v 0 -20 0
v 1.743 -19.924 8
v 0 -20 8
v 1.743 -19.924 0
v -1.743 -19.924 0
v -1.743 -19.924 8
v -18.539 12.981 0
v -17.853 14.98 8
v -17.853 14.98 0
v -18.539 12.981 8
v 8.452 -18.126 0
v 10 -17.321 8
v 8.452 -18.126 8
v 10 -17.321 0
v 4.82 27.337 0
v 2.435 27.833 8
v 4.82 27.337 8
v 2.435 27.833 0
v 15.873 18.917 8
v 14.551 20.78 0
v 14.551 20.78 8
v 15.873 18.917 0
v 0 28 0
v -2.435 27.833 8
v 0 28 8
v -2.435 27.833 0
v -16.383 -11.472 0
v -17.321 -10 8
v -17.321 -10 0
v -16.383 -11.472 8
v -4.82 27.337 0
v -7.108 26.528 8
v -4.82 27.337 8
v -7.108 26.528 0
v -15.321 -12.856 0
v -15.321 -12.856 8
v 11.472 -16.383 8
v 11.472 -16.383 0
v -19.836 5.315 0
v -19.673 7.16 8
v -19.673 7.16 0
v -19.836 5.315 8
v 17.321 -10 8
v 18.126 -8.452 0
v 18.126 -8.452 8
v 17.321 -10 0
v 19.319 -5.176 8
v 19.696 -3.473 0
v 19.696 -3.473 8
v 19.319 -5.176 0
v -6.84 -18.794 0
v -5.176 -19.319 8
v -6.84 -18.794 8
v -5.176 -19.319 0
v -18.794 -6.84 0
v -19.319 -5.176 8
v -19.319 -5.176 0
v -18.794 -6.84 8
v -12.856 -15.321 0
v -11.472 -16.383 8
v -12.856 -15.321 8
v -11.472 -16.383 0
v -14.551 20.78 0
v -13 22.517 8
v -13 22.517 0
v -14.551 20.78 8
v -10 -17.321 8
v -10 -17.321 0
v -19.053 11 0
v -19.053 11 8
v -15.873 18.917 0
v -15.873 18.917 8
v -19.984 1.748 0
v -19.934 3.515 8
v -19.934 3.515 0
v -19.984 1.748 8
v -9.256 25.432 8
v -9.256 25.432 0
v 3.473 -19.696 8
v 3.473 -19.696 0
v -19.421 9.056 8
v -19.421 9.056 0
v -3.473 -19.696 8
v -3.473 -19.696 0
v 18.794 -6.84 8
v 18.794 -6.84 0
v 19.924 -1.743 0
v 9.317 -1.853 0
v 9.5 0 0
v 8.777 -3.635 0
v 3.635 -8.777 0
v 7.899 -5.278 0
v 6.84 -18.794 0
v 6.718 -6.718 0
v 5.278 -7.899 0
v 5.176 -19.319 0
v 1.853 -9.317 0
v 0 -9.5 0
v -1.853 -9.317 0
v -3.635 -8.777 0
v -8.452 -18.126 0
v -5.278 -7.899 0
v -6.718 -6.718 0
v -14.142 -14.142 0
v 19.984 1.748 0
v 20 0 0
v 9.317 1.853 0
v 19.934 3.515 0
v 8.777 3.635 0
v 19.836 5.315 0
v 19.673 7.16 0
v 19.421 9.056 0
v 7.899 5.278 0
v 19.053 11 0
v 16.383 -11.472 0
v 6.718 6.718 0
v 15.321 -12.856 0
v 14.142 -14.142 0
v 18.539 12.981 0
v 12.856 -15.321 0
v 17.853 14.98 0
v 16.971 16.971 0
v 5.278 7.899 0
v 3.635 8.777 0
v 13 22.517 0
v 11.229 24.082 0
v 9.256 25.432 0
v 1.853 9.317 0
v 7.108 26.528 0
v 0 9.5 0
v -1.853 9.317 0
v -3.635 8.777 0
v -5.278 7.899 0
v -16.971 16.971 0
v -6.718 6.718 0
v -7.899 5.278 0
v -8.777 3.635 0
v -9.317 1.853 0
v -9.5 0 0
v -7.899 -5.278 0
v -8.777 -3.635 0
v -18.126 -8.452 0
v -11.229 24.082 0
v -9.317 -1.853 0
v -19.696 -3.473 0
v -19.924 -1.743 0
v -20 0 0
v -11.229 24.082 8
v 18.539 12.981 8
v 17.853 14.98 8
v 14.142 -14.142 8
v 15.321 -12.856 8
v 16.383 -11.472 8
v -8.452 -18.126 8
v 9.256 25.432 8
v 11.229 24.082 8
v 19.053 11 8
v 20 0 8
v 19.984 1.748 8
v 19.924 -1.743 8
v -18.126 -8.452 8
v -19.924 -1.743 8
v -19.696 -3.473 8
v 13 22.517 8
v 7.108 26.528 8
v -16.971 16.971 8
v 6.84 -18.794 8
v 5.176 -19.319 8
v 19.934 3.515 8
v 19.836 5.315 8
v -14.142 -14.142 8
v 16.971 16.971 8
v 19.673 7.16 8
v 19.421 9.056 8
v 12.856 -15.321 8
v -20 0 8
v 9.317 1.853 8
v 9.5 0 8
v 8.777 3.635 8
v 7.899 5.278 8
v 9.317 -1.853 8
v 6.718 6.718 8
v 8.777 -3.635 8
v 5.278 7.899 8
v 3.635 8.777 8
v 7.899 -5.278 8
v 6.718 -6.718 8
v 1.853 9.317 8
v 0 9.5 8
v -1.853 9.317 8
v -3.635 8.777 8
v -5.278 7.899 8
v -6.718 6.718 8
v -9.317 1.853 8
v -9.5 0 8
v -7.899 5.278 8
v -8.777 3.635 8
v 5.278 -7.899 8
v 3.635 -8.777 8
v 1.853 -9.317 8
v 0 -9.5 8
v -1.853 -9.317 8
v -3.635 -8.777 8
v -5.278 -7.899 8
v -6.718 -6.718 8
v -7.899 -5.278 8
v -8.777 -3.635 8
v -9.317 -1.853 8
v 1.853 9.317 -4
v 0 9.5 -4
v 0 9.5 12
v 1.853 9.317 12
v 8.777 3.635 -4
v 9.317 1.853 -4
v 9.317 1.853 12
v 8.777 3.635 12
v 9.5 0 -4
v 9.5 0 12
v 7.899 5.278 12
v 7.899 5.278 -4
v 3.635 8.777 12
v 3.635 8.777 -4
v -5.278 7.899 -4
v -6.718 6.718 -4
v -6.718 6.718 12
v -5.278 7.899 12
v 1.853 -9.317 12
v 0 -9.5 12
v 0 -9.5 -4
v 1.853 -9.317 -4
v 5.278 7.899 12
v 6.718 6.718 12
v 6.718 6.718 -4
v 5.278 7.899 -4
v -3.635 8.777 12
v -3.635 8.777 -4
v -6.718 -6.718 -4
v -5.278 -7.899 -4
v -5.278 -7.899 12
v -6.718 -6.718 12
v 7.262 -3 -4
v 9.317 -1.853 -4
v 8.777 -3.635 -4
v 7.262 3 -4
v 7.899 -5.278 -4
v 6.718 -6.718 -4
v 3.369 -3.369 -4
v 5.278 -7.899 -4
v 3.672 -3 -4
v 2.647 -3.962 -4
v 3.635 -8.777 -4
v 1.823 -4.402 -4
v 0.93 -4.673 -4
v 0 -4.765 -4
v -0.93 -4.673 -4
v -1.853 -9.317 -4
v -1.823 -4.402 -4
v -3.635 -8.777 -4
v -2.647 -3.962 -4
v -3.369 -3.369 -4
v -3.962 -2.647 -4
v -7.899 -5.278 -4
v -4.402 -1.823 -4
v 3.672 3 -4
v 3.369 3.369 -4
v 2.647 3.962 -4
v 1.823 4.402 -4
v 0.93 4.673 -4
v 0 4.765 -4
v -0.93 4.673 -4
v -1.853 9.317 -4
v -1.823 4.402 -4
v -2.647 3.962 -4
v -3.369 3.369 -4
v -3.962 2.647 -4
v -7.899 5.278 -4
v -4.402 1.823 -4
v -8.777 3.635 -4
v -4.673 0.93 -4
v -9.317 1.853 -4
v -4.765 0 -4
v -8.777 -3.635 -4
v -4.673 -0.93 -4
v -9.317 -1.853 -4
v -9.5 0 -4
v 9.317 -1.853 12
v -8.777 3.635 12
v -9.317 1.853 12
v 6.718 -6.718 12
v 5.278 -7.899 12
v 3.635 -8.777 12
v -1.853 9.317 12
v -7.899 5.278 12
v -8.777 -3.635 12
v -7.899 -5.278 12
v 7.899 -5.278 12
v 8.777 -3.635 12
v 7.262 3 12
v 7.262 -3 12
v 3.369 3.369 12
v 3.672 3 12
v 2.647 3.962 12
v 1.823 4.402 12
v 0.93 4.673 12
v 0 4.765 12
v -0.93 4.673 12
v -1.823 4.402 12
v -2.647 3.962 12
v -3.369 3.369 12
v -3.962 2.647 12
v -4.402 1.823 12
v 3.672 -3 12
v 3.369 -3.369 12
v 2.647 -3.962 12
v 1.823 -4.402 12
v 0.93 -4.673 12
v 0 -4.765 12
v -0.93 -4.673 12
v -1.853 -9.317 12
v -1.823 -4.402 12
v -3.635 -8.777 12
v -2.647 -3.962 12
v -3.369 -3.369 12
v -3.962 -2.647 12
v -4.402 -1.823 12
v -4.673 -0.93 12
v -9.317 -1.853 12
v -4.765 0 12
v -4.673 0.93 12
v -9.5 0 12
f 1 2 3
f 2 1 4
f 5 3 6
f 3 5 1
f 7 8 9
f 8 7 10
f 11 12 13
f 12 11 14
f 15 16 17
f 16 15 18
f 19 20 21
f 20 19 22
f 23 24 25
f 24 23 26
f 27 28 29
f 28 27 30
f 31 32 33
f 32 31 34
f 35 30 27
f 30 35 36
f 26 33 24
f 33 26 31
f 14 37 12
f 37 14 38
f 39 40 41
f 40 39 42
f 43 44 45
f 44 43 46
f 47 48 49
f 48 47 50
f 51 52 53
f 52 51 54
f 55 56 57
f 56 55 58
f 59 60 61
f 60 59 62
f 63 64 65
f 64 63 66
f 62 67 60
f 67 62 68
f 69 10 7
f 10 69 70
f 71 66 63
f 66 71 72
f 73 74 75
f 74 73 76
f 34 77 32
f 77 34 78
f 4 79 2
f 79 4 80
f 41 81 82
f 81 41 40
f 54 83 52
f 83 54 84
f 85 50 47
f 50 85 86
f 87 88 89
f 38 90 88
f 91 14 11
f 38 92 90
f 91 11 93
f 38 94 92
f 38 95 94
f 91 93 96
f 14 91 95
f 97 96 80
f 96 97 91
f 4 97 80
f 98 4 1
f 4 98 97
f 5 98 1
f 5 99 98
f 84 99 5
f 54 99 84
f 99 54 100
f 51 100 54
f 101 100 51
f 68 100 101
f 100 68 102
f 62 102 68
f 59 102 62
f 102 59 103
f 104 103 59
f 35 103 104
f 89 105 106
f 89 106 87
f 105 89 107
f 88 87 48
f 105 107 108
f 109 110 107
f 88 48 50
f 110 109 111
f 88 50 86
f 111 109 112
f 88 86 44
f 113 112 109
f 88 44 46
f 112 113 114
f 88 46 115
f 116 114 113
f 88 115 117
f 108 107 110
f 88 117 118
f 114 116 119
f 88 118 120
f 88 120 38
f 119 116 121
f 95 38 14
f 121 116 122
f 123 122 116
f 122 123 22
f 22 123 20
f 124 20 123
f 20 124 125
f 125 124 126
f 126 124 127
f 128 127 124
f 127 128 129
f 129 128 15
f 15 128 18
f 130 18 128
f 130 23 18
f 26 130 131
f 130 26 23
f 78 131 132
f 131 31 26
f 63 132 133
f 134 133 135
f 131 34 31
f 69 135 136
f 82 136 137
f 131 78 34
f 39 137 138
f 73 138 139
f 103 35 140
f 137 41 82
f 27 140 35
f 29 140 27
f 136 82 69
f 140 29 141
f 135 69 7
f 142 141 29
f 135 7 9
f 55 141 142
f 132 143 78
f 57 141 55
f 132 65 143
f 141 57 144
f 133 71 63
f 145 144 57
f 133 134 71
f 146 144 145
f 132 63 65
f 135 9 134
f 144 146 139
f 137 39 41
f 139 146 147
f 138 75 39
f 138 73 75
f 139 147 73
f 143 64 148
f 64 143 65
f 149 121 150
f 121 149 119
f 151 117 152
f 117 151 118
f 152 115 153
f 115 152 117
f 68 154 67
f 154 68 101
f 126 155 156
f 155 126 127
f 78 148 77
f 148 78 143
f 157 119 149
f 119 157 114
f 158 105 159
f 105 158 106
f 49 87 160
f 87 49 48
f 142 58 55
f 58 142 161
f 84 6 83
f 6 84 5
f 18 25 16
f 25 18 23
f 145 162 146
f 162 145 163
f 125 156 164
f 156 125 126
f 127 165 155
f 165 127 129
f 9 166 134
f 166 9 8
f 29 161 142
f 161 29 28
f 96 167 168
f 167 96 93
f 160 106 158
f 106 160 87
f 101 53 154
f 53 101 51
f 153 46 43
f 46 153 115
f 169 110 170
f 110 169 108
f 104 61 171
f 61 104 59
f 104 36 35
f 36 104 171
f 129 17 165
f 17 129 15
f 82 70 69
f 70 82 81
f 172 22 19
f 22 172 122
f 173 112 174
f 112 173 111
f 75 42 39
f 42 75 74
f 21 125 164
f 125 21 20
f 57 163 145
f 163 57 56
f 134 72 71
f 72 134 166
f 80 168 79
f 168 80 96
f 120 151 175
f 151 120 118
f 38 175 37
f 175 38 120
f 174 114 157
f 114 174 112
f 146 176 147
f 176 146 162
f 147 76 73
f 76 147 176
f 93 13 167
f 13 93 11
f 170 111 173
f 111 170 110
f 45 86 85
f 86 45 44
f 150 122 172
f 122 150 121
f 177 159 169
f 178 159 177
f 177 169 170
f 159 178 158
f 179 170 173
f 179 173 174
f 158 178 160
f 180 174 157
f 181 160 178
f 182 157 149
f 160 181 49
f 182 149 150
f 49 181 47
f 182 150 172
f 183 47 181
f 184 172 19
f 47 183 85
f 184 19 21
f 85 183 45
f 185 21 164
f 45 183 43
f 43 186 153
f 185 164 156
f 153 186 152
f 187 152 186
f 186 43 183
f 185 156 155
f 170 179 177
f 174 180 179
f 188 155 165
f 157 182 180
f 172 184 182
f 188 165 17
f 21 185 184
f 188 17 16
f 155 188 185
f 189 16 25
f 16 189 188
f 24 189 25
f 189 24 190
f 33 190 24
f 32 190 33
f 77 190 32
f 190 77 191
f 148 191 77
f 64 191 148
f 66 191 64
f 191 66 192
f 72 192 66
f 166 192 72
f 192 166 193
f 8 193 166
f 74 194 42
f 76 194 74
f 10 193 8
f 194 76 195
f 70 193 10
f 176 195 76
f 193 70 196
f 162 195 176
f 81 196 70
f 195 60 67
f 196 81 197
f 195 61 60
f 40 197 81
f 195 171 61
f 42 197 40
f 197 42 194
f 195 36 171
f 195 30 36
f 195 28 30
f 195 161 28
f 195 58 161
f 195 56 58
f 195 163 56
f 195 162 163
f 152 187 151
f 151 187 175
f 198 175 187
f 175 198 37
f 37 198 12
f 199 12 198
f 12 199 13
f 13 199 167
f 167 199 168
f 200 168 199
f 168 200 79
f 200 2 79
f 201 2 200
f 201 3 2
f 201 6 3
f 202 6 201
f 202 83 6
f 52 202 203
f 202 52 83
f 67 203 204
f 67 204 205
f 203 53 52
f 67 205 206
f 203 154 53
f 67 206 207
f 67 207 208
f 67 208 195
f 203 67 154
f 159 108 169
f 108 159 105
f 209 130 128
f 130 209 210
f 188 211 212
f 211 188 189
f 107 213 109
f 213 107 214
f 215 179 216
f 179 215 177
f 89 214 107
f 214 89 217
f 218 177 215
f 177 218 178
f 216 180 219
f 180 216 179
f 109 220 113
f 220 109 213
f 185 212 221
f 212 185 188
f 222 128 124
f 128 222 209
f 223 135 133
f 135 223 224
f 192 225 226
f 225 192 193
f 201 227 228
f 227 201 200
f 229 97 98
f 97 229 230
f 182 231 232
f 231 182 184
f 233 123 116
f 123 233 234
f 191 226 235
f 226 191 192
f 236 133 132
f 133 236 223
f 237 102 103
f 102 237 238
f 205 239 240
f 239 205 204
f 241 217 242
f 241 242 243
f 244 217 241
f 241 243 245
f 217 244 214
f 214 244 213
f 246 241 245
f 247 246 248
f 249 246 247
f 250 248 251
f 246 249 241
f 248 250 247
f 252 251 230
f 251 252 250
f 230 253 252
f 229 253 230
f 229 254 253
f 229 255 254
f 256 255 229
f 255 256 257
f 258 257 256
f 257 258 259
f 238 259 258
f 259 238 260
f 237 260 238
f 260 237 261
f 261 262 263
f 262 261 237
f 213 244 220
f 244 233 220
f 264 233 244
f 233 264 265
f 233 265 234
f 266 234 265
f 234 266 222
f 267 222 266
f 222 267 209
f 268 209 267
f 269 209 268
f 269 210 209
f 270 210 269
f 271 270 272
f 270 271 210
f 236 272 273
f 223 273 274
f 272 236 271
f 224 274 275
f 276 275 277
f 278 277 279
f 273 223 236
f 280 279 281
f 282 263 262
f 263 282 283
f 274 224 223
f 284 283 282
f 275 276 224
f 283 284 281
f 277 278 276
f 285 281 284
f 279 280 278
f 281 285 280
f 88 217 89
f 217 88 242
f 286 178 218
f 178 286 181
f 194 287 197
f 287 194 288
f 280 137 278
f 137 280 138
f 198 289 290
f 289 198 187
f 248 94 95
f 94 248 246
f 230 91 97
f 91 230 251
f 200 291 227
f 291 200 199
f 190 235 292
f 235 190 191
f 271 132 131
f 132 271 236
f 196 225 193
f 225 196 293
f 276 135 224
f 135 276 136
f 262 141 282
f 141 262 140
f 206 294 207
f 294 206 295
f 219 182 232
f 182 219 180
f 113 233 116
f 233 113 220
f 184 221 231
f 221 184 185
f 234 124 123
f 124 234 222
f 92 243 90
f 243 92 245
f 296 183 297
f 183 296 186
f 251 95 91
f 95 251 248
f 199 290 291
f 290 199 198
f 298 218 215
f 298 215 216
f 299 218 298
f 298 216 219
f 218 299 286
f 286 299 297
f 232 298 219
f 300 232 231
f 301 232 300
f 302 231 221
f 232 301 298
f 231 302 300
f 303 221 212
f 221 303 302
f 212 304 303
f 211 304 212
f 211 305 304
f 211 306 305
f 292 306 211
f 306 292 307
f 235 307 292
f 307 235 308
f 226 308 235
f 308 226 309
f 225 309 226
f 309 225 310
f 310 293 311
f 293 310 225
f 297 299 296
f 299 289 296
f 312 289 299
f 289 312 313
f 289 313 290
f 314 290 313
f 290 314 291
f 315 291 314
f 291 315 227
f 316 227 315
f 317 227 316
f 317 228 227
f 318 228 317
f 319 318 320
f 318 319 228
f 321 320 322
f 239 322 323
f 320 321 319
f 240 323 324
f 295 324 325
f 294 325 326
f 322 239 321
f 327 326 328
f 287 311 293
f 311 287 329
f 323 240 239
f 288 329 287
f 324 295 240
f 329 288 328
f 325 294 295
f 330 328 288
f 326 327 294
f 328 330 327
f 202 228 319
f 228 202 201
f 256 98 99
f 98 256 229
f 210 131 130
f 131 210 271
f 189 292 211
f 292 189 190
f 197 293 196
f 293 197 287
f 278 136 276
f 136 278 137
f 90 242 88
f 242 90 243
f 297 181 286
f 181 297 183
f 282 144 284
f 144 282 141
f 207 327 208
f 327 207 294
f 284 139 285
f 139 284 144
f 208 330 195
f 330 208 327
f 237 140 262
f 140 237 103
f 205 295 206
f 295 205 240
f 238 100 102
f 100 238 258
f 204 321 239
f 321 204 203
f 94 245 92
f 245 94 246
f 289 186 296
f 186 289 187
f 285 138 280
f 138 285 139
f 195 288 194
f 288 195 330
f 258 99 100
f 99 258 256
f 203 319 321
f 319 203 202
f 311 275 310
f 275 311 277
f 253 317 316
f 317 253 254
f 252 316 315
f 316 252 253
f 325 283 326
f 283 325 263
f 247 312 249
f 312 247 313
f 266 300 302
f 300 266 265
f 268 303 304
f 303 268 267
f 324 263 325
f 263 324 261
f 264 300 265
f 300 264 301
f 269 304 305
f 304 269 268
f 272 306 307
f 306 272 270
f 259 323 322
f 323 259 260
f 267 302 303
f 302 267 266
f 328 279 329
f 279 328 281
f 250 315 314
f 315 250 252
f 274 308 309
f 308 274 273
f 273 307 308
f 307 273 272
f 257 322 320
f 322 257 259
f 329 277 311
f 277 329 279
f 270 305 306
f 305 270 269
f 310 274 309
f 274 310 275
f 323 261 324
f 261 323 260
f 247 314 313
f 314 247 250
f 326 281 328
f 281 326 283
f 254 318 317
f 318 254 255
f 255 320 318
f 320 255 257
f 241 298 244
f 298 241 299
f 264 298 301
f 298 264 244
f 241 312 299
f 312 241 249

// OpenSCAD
$fn = 32;

// ----------------------------------------------------------------------
// Cam: base radius 20 mm with a 8 mm lift over 180 degrees
// ----------------------------------------------------------------------

// --- parameters (mm) ---
base_r = 20;              // base radius
lift = 8;                 // lift height above the base radius
lift_span = 180;          // angular width of the lift
lift_start = 0;           // angle where the lift starts
cam_t = 8;                // cam plate thickness
hub_d = 19;               // hub diameter
hub_h = 16;               // hub height
bore_d = 9.53;            // bore
key_w = 6;                // keyway width
key_depth = 2.74;         // keyway depth

cam_profile = [[20, 0], [19.984, 1.748], [19.934, 3.515], [19.836, 5.315], [19.673, 7.16], [19.421, 9.056], [19.053, 11], [18.539, 12.981], [17.853, 14.98], [16.971, 16.971], [15.873, 18.917], [14.551, 20.78], [13, 22.517], [11.229, 24.082], [9.256, 25.432], [7.108, 26.528], [4.82, 27.337], [2.435, 27.833], [0, 28], [-2.435, 27.833], [-4.82, 27.337], [-7.108, 26.528], [-9.256, 25.432], [-11.229, 24.082], [-13, 22.517], [-14.551, 20.78], [-15.873, 18.917], [-16.971, 16.971], [-17.853, 14.98], [-18.539, 12.981], [-19.053, 11], [-19.421, 9.056], [-19.673, 7.16], [-19.836, 5.315], [-19.934, 3.515], [-19.984, 1.748], [-20, 0], [-19.924, -1.743], [-19.696, -3.473], [-19.319, -5.176], [-18.794, -6.84], [-18.126, -8.452], [-17.321, -10], [-16.383, -11.472], [-15.321, -12.856], [-14.142, -14.142], [-12.856, -15.321], [-11.472, -16.383], [-10, -17.321], [-8.452, -18.126], [-6.84, -18.794], [-5.176, -19.319], [-3.473, -19.696], [-1.743, -19.924], [0, -20], [1.743, -19.924], [3.473, -19.696], [5.176, -19.319], [6.84, -18.794], [8.452, -18.126], [10, -17.321], [11.472, -16.383], [12.856, -15.321], [14.142, -14.142], [15.321, -12.856], [16.383, -11.472], [17.321, -10], [18.126, -8.452], [18.794, -6.84], [19.319, -5.176], [19.696, -3.473], [19.924, -1.743]];

difference() {
  union() {
    linear_extrude(height = cam_t) polygon(cam_profile);
    /* hub, proud of the cam plate on both sides */
    translate([0, 0, -4]) cylinder(h = hub_h, d = hub_d);
  }
  /* bore through the hub, 2.5 mm clear on both faces */
  translate([0, 0, -6.5]) cylinder(h = hub_h + 5, d = bore_d);
  /* keyway, milled through the whole hub */
  translate([2.022, -3, -6.5]) cube([5.24, 6, 21]);
}
